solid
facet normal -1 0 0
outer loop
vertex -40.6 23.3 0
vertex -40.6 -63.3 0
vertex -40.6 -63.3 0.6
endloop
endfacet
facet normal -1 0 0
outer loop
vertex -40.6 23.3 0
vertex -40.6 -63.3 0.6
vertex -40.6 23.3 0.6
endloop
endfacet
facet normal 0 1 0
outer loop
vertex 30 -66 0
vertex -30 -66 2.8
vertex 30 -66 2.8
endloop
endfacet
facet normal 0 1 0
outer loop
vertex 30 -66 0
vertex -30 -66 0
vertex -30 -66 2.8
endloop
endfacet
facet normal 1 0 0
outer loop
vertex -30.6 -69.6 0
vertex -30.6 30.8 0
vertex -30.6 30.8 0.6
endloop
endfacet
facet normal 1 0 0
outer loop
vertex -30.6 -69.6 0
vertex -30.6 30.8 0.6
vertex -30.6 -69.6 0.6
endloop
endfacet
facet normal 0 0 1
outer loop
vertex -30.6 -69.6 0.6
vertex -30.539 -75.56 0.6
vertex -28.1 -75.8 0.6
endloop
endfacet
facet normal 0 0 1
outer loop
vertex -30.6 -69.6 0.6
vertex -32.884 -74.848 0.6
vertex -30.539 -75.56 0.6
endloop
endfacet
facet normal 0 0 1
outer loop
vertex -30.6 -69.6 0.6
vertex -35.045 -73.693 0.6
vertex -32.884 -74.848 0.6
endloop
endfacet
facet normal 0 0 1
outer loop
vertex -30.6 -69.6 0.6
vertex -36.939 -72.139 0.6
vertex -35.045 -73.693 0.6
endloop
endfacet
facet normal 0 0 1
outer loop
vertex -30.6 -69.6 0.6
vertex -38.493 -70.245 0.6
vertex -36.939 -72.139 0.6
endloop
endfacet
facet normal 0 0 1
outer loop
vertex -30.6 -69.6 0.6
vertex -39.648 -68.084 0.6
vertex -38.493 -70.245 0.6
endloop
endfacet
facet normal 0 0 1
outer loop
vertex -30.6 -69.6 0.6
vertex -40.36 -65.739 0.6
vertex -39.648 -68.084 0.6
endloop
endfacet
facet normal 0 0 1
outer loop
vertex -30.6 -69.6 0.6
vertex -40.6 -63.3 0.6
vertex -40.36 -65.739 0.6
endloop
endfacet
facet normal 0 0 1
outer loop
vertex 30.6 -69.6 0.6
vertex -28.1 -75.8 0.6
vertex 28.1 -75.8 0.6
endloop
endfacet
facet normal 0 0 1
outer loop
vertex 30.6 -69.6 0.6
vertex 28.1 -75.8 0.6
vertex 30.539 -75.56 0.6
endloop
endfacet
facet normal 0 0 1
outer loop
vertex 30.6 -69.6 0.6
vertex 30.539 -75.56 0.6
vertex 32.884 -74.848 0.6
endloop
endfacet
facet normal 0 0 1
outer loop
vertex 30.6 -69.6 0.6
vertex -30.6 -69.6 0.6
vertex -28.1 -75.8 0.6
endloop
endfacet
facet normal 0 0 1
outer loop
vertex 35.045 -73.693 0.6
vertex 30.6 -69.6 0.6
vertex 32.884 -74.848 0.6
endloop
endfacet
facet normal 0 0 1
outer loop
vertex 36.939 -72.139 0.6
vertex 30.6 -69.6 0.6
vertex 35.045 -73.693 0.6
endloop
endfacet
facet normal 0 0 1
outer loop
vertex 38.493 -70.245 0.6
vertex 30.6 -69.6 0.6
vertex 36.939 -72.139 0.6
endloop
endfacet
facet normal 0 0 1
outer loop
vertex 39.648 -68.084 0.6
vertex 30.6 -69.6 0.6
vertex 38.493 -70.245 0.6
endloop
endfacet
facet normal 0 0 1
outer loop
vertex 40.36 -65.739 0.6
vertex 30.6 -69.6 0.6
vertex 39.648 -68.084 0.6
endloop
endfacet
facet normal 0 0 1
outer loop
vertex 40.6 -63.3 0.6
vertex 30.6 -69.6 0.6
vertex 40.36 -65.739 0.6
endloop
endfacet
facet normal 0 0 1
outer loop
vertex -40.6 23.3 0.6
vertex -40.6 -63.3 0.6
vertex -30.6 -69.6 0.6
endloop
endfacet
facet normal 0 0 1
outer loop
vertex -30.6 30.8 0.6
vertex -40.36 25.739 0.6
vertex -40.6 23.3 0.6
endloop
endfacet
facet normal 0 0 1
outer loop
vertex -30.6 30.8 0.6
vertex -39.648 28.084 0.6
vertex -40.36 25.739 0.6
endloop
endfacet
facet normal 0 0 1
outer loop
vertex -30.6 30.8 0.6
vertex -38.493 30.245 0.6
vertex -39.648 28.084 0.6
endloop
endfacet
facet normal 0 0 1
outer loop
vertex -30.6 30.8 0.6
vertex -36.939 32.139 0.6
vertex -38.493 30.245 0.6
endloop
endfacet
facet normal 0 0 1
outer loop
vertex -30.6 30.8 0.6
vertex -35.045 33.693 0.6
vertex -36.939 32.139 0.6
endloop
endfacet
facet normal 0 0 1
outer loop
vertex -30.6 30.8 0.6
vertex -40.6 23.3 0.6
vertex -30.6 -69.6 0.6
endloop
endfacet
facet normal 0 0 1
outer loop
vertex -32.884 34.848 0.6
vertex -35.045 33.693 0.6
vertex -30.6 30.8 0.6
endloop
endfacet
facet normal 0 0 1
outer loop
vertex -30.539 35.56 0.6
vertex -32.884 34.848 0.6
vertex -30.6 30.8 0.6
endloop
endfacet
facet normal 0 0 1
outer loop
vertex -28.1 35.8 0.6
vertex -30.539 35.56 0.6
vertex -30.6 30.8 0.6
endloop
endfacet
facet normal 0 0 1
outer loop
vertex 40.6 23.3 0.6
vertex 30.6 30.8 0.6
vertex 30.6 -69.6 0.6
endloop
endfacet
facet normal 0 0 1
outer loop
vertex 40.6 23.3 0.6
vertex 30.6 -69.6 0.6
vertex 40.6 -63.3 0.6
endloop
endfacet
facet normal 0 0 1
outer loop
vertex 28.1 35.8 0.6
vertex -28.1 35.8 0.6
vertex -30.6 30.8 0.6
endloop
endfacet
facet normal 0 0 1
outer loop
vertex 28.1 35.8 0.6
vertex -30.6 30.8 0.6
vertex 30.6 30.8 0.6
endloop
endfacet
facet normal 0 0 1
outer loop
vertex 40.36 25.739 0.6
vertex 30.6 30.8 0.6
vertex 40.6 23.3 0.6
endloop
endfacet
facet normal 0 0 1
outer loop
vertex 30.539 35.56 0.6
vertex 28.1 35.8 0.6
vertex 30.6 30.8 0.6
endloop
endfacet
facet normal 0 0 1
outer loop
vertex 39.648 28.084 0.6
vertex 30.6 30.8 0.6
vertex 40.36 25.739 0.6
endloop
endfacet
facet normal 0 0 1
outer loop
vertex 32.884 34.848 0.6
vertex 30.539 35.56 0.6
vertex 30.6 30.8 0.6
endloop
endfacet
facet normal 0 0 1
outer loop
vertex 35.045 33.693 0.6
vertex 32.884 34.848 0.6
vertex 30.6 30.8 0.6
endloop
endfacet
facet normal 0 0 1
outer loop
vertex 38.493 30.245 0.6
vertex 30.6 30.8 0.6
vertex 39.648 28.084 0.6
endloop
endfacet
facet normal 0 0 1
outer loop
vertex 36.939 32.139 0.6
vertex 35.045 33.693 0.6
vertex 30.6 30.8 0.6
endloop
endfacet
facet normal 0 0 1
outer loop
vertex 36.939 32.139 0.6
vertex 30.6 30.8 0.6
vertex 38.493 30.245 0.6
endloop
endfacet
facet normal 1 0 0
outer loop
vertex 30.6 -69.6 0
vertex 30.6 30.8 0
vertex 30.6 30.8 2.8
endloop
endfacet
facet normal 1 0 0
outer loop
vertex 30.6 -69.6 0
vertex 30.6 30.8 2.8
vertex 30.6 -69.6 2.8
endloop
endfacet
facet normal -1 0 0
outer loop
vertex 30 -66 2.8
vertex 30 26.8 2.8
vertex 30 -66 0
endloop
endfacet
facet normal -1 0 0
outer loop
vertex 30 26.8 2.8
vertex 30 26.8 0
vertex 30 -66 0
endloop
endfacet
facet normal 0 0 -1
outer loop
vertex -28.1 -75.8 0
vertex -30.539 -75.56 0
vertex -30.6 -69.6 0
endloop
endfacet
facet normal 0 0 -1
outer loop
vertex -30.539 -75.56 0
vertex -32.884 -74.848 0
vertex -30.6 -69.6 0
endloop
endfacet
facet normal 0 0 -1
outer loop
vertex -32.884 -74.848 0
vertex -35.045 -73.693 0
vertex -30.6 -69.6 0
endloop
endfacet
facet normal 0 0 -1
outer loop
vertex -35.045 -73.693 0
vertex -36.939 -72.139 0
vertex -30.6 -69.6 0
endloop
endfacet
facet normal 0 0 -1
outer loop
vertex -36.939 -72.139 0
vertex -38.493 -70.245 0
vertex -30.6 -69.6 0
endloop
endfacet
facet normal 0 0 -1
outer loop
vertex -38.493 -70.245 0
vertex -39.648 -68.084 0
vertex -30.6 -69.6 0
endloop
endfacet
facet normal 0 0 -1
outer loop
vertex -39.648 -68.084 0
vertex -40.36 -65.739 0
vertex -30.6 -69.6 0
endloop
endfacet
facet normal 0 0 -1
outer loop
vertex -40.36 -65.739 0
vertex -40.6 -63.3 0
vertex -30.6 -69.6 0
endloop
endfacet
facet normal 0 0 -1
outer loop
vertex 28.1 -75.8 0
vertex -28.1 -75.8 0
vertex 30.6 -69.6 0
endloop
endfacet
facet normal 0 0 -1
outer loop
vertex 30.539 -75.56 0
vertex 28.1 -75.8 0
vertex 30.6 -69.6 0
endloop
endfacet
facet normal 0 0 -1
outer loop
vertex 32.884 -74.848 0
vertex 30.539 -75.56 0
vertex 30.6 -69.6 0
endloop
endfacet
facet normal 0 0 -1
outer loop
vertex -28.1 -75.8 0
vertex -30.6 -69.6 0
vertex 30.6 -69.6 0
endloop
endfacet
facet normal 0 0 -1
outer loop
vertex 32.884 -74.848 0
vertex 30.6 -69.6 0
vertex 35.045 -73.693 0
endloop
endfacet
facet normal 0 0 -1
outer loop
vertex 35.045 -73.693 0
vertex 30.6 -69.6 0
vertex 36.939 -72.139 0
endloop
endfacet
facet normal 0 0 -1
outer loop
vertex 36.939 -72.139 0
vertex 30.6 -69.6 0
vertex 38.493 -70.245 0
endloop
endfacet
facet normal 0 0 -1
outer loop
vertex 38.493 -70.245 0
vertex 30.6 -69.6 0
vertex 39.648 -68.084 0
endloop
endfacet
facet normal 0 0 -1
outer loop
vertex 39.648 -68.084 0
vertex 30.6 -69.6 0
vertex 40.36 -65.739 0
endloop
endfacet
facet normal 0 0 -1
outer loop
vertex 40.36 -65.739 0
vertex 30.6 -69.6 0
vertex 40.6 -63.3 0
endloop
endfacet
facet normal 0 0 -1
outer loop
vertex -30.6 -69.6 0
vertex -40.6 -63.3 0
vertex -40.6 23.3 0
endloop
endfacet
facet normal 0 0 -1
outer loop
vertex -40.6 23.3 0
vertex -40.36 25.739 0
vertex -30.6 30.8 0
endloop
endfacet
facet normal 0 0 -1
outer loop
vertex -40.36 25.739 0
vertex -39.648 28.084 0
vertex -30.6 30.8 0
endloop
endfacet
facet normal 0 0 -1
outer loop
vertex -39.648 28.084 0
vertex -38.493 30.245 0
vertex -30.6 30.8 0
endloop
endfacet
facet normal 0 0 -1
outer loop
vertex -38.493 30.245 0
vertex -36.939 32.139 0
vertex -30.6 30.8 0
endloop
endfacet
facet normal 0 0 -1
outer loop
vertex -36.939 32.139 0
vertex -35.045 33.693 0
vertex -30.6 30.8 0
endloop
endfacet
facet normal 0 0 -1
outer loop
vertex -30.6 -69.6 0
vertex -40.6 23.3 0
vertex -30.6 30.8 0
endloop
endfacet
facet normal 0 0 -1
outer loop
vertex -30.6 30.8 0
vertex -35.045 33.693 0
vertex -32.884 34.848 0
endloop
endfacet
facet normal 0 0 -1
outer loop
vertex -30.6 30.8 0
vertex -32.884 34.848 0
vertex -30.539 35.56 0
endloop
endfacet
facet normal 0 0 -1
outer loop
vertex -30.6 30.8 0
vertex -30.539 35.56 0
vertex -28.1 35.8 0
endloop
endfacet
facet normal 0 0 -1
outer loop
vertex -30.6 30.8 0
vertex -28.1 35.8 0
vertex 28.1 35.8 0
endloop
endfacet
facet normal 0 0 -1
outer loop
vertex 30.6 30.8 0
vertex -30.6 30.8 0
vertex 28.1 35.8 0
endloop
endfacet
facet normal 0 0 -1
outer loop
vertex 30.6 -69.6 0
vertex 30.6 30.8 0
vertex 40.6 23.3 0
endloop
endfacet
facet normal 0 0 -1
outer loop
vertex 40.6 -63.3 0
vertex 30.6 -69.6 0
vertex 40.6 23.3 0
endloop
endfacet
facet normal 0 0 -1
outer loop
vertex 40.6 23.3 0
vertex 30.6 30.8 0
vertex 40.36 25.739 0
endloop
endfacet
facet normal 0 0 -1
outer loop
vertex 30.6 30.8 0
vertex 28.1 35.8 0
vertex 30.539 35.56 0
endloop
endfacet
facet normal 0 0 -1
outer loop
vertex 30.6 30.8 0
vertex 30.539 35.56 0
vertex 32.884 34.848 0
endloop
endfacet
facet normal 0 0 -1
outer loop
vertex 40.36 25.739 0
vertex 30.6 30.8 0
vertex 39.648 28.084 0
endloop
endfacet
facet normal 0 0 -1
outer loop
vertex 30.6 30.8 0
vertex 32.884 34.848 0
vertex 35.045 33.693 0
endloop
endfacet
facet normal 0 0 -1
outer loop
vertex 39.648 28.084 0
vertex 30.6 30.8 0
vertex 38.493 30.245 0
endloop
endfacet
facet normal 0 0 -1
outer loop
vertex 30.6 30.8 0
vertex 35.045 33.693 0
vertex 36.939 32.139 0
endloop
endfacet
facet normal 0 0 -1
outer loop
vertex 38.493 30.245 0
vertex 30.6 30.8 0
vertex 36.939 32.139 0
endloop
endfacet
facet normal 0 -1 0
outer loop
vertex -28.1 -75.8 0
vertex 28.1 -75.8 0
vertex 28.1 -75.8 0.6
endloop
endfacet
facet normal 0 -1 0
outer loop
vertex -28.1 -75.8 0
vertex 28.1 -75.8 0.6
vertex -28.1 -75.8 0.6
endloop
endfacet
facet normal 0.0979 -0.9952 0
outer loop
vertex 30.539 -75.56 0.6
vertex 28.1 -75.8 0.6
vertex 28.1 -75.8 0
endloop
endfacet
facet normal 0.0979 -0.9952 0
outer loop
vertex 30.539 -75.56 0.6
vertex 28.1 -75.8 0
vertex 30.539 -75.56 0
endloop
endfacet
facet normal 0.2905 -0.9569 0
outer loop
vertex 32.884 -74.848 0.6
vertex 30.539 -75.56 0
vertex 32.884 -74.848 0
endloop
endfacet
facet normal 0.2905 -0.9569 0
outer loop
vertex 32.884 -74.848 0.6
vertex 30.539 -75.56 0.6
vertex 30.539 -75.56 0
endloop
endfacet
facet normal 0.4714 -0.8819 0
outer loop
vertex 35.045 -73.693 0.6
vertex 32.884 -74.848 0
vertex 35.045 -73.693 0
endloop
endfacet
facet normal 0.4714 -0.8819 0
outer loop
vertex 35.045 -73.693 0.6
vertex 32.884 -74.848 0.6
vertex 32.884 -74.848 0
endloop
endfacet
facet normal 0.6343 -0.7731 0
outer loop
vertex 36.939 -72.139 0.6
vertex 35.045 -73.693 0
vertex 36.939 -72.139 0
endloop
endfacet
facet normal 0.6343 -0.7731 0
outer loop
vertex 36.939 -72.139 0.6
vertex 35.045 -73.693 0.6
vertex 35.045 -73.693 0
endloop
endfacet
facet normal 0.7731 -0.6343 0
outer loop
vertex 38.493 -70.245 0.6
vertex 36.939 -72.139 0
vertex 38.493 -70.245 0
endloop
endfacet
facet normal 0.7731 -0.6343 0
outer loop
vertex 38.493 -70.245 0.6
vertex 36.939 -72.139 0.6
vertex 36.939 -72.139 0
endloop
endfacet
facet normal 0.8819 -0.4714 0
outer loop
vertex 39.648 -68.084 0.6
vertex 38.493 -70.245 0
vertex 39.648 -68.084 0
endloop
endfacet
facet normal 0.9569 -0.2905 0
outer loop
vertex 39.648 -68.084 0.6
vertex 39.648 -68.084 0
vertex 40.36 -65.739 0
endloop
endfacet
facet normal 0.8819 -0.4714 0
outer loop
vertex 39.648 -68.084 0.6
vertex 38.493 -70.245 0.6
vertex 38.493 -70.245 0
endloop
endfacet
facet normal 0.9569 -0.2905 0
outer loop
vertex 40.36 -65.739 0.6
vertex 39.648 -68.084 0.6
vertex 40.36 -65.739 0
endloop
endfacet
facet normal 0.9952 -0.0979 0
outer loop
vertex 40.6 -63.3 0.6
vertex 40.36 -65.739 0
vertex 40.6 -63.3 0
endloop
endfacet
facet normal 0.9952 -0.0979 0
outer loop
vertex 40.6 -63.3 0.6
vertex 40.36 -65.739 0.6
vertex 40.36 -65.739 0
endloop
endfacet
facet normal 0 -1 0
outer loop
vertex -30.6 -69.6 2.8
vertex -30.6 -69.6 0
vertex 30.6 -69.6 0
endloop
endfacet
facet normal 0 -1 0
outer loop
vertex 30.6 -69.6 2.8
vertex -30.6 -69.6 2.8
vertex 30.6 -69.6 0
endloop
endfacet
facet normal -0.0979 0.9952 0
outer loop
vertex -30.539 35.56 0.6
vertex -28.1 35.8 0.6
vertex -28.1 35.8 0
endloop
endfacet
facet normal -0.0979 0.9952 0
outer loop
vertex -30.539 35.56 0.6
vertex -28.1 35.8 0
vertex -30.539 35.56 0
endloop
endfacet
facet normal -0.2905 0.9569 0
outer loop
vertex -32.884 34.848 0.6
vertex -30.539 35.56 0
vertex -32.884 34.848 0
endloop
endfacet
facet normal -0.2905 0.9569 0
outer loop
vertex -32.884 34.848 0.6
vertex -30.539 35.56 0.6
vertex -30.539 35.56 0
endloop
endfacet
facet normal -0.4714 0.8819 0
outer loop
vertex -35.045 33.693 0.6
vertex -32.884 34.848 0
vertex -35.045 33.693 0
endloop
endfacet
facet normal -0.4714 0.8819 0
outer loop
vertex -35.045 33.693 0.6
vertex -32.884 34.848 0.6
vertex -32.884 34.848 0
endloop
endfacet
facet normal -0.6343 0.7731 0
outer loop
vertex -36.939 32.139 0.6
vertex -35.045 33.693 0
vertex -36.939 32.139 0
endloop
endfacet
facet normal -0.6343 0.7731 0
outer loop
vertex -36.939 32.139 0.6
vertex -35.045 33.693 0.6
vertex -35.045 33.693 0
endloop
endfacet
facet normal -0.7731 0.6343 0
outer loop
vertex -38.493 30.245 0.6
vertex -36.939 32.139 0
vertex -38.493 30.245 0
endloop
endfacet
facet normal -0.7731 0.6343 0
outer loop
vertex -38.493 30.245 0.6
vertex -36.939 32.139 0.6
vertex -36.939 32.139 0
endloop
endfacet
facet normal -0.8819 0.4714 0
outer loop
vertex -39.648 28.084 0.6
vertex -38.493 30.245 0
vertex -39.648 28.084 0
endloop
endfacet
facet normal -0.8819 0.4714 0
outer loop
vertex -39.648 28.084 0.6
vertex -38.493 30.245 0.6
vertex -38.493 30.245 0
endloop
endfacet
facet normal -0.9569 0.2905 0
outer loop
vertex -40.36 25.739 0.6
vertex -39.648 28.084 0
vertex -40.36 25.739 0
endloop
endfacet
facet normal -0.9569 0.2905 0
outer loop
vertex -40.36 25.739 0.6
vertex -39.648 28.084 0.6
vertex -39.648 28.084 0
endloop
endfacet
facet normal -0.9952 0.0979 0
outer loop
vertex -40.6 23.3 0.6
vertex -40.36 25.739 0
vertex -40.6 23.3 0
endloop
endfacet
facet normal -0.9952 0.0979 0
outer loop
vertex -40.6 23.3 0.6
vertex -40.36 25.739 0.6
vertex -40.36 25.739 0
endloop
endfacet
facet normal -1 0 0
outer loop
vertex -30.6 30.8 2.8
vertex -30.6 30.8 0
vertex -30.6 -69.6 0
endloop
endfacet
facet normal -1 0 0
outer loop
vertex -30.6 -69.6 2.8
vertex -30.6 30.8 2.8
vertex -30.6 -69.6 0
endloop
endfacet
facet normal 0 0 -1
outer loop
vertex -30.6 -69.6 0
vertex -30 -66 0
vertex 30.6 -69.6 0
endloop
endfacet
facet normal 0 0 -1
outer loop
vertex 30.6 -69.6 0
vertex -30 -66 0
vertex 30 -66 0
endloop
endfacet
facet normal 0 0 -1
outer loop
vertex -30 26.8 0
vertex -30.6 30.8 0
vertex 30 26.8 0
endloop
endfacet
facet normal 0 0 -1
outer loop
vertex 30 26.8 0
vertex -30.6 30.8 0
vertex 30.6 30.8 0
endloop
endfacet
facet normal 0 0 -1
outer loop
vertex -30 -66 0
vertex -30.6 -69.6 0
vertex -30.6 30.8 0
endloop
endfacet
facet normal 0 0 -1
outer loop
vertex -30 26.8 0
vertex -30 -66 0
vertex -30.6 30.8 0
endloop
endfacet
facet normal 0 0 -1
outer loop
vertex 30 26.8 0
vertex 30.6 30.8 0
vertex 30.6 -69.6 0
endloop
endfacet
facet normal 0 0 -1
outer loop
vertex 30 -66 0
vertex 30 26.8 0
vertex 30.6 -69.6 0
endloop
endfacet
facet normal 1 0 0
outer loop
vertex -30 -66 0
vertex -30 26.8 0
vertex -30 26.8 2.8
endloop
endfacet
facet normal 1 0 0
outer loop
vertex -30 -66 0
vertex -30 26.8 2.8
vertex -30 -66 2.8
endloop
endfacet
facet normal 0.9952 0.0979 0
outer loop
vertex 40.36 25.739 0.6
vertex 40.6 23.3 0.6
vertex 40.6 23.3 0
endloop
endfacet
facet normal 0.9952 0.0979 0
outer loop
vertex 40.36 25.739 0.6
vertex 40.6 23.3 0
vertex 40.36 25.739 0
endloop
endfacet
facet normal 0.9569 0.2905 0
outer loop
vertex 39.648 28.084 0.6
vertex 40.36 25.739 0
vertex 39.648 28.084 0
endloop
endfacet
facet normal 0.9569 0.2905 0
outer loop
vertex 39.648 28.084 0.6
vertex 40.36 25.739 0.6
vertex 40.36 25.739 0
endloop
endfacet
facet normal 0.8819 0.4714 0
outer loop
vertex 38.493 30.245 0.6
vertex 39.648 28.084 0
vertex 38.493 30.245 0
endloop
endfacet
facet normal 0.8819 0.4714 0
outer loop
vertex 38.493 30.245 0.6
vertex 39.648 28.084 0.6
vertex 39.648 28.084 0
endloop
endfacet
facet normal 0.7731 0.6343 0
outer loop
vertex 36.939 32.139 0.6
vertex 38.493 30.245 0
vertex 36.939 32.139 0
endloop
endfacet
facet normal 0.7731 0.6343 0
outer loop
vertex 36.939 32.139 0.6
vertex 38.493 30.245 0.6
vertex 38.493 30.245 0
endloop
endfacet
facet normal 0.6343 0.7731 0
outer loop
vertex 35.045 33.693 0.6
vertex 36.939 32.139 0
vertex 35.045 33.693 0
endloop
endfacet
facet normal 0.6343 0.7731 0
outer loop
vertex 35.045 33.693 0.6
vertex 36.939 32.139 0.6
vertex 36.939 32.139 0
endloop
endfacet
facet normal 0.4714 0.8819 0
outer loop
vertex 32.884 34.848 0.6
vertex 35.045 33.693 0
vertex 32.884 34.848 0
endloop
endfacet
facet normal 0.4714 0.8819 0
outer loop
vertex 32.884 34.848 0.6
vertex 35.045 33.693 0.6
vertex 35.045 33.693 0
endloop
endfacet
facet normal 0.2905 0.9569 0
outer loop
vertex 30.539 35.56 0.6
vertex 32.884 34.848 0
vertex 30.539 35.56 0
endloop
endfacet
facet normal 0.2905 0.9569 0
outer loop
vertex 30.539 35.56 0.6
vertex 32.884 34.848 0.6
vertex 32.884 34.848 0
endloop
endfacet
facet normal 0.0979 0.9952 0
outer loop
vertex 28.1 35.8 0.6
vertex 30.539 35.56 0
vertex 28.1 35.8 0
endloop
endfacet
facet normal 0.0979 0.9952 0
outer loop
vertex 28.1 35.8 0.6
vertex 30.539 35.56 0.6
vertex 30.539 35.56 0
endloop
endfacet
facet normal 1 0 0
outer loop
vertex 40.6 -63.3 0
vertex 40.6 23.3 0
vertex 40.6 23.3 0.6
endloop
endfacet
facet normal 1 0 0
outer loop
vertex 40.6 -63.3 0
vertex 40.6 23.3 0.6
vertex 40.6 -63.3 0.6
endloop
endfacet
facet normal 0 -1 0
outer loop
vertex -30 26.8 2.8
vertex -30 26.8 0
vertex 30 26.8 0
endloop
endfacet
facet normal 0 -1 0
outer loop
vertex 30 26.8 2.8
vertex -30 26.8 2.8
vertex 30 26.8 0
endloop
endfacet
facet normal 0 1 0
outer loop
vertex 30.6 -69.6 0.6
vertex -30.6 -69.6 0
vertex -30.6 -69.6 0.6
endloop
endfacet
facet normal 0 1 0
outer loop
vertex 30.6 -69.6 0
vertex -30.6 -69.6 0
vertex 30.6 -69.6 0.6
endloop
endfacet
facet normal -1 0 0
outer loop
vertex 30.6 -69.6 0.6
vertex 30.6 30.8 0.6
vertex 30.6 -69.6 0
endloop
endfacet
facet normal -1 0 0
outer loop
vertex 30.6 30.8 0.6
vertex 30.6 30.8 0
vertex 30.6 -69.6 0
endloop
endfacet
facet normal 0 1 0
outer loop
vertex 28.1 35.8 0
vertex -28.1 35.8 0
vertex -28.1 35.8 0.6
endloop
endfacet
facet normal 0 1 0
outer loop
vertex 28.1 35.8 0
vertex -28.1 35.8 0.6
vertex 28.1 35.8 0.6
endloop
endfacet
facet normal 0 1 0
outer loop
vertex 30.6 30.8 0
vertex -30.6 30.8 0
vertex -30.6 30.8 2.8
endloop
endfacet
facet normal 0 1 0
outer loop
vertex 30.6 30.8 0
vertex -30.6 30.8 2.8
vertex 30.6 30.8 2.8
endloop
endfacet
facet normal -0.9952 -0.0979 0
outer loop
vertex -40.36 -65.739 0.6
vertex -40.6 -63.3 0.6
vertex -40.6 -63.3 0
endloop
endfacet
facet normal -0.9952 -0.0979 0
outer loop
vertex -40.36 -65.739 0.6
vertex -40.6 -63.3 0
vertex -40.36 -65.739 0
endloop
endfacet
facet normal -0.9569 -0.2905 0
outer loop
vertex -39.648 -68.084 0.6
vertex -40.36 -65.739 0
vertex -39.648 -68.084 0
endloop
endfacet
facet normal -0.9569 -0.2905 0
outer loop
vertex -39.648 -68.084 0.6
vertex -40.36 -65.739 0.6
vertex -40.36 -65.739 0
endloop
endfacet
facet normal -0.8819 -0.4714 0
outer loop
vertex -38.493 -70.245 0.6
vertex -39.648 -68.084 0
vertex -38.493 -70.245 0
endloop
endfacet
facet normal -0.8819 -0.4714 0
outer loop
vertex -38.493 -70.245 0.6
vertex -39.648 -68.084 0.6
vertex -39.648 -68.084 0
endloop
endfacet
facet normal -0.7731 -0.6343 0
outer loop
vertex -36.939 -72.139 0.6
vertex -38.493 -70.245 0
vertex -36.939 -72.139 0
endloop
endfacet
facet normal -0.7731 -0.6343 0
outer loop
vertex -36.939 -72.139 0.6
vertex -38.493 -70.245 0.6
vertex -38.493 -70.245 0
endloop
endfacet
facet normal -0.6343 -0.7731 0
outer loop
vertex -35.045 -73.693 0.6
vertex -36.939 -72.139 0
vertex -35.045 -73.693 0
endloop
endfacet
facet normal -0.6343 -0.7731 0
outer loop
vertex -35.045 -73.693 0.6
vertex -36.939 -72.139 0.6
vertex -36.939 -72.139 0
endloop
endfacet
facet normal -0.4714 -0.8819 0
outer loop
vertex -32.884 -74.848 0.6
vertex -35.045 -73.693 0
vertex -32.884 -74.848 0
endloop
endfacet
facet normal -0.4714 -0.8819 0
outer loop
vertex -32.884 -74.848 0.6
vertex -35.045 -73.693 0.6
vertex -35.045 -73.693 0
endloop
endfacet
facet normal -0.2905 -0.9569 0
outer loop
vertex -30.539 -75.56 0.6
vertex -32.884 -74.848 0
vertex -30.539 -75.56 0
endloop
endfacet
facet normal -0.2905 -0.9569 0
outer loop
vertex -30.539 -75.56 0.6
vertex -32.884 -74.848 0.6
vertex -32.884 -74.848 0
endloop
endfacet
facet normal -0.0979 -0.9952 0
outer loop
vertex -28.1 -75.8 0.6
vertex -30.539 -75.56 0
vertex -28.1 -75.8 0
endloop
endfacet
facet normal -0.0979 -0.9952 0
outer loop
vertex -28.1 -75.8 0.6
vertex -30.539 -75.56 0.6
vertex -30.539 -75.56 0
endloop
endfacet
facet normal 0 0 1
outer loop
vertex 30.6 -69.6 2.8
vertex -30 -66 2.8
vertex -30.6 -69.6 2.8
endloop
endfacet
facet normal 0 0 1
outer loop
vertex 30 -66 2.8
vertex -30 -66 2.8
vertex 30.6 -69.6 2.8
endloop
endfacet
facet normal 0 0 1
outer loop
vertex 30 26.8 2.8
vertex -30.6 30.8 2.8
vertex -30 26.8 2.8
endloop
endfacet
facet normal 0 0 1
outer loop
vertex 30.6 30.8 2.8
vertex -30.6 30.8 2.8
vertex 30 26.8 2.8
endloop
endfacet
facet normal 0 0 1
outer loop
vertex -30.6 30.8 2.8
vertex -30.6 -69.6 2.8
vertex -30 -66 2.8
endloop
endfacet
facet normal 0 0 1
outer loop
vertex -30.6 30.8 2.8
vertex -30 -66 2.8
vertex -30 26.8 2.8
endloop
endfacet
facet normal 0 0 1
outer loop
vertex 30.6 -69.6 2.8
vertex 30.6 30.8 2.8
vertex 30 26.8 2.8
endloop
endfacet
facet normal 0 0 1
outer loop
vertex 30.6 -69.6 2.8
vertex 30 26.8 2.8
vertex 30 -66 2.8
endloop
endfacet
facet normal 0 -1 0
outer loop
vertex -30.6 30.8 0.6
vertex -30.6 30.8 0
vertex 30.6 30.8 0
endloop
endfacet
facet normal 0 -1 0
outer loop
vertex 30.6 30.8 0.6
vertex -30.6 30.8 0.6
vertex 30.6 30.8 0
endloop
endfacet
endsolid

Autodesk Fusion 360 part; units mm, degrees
sketch "Sketch1" plane through (0, 0, 0) normal (0, 0, 1) x (1, 0, 0)
  line L0 (-30.6, 30.8) -> (30.6, 30.8)
  line L1 (-30.6, 30.8) -> (-30.6, -69.6)
  line L2 (0, 30) -> (0, -70)
  line L3 (30.6, 30.8) -> (30.6, -69.6)
  line L4 (-30, 30.8) -> (-30, -70)
  line L5 (30, 30.8) -> (30, -70)
  line L6 (-30, 26.8) -> (30, 26.8)
  line L7 (-30, -66) -> (30, -66)
  line L8 (-33.5, 50) -> (-33.3333, 50)
  line L9 (33.3333, 50) -> (33.5, 50)
  line L10 (-30.6, -69.6) -> (30.6, -69.6)
  line L11 (-30.6, 30.8) -> (30.6, -69.6)
  line L12 (-30.6, -69.6) -> (30.6, 30.8)
  line L13 (40.6, -75.8) -> (-40.6, -75.8)
  line L14 (-40.6, -75.8) -> (-40.6, 35.8)
  line L15 (-40.6, 35.8) -> (40.6, 35.8)
  line L16 (40.6, 35.8) -> (40.6, -75.8)
  line L17 (40.6, -75.8) -> (-40.6, 35.8) construction
  line L18 (-40.6, -75.8) -> (40.6, 35.8) construction
  point P0 (-0.25, 0)
  point P1 (0, -20)
  dimension "d22" = 60
  dimension "d23" = 0.6
  dimension "d24" = 100.4
  dimension "d27" = 10
  dimension "d28" = 5
extrude "Extrude3" add sketch "Sketch1" along normal blind 2.8 contours L1 L4 L11 L12 | L0 L4 L11 | L0 L4 L5 L6 L11 L12 | L4 L10 L12 | L4 L6 L11 | L0 L5 L12 | L2 L4 L7 L10 L12 | L4 L7 L12 | L3 L5 L11 L12 | L5 L6 L12 | L2 L5 L7 L10 L11 | L5 L10 L11 | L5 L7 L11 makes body 1
extrude "Extrude4" add sketch "Sketch1" along normal blind 0.6 separate body makes body 2
fillet "Fillet3" radius 12.5 4 edges at (40.6, 35.8, 0.3) (40.6, -75.8, 0.3) (-40.6, -75.8, 0.3) (-40.6, 35.8, 0.3) on bodies 2
